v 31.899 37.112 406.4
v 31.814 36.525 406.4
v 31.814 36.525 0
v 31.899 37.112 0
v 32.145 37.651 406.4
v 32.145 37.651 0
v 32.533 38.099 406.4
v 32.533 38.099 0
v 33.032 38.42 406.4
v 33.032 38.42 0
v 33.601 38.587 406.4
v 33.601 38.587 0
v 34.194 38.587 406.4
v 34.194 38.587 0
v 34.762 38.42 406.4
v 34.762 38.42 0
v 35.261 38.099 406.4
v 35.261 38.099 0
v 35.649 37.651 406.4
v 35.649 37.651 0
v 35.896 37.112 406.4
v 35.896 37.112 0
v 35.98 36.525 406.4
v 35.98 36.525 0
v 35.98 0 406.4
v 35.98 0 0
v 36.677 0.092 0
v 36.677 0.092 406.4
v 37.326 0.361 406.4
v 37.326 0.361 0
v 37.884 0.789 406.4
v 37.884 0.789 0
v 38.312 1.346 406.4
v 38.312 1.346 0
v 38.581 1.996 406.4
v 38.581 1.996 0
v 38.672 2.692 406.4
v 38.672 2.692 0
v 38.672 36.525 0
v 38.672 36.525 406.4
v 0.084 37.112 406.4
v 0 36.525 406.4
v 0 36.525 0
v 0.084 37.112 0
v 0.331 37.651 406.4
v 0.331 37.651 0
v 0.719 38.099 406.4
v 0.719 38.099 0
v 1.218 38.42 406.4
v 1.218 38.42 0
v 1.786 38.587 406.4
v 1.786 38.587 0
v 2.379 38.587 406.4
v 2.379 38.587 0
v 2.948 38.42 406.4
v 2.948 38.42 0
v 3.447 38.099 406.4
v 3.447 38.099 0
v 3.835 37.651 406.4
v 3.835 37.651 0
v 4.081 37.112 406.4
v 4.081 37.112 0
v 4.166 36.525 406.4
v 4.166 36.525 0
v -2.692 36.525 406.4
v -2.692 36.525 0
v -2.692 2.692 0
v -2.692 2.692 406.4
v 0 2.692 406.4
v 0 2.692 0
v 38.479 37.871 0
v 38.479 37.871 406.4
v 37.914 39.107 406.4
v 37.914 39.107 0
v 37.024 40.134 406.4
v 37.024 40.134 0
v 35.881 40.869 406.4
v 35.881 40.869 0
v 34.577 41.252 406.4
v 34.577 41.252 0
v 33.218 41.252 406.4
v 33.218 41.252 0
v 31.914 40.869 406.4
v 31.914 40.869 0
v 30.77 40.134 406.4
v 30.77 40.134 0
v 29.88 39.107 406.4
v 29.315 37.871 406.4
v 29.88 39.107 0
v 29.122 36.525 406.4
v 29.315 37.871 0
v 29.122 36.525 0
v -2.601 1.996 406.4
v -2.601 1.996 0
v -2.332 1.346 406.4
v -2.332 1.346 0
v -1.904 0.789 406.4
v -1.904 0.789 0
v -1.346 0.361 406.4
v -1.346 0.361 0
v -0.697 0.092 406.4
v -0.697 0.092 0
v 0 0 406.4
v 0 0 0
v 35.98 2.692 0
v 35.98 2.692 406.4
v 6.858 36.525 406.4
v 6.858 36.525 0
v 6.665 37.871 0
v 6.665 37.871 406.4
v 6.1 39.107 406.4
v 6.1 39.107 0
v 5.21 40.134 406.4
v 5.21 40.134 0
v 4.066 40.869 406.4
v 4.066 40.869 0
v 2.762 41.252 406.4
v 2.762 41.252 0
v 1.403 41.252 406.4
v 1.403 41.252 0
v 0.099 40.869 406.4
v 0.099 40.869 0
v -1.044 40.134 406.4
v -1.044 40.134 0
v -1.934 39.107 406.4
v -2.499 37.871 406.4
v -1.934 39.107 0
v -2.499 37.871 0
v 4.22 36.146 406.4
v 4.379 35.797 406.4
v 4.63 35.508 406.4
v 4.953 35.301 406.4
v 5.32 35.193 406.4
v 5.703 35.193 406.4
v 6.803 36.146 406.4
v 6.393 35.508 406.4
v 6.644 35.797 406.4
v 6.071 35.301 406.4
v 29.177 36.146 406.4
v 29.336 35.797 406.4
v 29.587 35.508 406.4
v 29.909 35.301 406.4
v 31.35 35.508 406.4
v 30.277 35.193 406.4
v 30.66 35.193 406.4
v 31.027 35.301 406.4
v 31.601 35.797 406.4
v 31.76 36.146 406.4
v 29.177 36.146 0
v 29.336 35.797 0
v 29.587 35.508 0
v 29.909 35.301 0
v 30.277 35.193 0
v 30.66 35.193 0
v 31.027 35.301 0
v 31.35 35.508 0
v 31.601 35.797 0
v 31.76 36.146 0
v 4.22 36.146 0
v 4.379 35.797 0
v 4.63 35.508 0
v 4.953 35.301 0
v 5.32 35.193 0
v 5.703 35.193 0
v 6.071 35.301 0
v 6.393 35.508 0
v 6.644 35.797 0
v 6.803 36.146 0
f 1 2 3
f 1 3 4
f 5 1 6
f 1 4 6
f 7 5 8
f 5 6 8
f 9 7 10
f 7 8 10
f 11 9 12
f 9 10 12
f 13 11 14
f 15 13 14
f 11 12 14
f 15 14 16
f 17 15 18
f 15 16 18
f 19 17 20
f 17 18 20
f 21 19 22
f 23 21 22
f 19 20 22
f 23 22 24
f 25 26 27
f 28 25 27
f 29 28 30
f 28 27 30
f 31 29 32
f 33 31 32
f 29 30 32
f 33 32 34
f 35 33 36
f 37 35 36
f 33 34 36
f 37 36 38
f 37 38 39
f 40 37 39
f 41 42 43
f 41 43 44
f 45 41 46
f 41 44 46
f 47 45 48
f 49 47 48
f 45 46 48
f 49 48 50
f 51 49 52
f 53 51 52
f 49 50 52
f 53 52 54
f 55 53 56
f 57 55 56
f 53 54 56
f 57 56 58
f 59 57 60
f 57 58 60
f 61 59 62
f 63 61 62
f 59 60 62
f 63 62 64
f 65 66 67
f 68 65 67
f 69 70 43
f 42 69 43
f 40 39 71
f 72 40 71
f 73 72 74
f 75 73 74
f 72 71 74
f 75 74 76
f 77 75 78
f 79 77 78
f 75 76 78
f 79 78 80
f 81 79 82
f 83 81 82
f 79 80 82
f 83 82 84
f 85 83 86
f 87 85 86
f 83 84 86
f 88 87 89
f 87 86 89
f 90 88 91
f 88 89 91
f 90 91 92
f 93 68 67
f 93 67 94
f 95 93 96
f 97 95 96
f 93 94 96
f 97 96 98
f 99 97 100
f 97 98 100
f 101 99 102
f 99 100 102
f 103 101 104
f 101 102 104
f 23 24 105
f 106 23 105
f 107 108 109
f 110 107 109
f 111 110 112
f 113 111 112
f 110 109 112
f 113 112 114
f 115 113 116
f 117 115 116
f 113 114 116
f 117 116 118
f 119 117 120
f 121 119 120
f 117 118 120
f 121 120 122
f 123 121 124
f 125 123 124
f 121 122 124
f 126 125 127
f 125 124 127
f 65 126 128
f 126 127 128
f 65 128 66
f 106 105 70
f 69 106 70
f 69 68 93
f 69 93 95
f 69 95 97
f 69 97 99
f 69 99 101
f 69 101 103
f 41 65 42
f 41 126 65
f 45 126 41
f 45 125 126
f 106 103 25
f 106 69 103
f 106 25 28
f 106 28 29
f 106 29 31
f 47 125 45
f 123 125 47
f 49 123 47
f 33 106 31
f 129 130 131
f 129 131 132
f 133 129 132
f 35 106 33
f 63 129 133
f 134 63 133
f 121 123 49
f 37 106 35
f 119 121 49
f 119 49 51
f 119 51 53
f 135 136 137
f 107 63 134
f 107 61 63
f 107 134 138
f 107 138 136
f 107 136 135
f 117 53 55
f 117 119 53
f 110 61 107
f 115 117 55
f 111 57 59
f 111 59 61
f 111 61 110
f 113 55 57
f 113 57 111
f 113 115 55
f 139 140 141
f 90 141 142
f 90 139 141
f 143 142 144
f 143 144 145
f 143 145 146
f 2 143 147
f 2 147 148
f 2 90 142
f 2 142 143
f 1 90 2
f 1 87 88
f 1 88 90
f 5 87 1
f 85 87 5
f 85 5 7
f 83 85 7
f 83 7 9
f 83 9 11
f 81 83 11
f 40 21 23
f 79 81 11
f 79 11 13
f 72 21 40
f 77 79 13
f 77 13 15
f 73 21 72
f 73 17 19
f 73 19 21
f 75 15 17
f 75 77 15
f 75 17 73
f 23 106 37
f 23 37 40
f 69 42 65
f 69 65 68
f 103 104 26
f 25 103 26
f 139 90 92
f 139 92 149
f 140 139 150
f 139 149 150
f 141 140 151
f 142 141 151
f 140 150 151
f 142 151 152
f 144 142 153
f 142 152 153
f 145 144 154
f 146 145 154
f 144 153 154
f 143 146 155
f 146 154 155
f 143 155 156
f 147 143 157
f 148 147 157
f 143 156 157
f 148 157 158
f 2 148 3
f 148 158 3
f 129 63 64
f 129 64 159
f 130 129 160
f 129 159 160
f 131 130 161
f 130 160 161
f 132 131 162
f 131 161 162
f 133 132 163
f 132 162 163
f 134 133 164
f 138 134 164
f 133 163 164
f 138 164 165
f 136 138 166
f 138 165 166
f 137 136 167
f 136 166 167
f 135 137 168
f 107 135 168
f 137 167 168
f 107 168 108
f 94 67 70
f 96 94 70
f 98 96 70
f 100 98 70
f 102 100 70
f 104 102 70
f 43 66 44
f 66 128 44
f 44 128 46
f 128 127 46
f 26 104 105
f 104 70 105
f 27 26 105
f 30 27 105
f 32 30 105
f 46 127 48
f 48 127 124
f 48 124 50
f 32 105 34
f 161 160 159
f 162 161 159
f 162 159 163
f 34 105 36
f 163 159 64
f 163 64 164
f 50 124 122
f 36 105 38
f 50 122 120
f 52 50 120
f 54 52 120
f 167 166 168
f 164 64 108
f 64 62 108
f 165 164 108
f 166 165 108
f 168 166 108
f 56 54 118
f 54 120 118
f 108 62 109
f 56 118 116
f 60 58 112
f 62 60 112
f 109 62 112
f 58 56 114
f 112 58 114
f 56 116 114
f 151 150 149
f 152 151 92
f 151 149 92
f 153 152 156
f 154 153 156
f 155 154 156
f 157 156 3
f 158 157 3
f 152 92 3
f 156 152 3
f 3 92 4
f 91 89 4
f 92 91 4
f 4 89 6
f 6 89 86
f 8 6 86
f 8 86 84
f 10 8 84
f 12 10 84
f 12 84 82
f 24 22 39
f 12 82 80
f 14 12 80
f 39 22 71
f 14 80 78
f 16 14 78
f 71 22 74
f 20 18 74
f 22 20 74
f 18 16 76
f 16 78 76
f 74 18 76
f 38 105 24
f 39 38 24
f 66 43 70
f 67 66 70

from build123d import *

# Parameters (mm, degrees)
EXTRUDE_1_DEPTH = 406.4


with BuildPart() as part:
    # 草图1 → 凸台-拉伸1 (new body)
    with BuildSketch(Plane.XY):
        with BuildLine():
            Line((0, 0), (35.98, 0))
            ThreePointArc((35.98, 0), (37.883814298, 0.788585702), (38.6724, 2.6924))
            Line((38.6724, 2.6924), (38.6724, 36.5252))
            ThreePointArc((38.6724, 36.5252), (33.8972, 41.3004), (29.122, 36.5252))
            ThreePointArc((29.122, 36.5252), (30.4682, 35.179), (31.8144, 36.5252))
            ThreePointArc((31.8144, 36.5252), (33.8972, 38.608), (35.98, 36.5252))
            Line((35.98, 36.5252), (35.98, 2.6924))
            Line((35.98, 2.6924), (0, 2.6924))
            Line((0, 2.6924), (0, 36.5252))
            ThreePointArc((0, 36.5252), (2.0828, 38.608), (4.1656, 36.5252))
            ThreePointArc((4.1656, 36.5252), (5.5118, 35.179), (6.858, 36.5252))
            ThreePointArc((6.858, 36.5252), (2.0828, 41.3004), (-2.6924, 36.5252))
            Line((-2.6924, 36.5252), (-2.6924, 2.6924))
            ThreePointArc((-2.6924, 2.6924), (-1.903814298, 0.788585702), (0, 0))
        make_face()
    extrude(amount=EXTRUDE_1_DEPTH)


solid = part.part
